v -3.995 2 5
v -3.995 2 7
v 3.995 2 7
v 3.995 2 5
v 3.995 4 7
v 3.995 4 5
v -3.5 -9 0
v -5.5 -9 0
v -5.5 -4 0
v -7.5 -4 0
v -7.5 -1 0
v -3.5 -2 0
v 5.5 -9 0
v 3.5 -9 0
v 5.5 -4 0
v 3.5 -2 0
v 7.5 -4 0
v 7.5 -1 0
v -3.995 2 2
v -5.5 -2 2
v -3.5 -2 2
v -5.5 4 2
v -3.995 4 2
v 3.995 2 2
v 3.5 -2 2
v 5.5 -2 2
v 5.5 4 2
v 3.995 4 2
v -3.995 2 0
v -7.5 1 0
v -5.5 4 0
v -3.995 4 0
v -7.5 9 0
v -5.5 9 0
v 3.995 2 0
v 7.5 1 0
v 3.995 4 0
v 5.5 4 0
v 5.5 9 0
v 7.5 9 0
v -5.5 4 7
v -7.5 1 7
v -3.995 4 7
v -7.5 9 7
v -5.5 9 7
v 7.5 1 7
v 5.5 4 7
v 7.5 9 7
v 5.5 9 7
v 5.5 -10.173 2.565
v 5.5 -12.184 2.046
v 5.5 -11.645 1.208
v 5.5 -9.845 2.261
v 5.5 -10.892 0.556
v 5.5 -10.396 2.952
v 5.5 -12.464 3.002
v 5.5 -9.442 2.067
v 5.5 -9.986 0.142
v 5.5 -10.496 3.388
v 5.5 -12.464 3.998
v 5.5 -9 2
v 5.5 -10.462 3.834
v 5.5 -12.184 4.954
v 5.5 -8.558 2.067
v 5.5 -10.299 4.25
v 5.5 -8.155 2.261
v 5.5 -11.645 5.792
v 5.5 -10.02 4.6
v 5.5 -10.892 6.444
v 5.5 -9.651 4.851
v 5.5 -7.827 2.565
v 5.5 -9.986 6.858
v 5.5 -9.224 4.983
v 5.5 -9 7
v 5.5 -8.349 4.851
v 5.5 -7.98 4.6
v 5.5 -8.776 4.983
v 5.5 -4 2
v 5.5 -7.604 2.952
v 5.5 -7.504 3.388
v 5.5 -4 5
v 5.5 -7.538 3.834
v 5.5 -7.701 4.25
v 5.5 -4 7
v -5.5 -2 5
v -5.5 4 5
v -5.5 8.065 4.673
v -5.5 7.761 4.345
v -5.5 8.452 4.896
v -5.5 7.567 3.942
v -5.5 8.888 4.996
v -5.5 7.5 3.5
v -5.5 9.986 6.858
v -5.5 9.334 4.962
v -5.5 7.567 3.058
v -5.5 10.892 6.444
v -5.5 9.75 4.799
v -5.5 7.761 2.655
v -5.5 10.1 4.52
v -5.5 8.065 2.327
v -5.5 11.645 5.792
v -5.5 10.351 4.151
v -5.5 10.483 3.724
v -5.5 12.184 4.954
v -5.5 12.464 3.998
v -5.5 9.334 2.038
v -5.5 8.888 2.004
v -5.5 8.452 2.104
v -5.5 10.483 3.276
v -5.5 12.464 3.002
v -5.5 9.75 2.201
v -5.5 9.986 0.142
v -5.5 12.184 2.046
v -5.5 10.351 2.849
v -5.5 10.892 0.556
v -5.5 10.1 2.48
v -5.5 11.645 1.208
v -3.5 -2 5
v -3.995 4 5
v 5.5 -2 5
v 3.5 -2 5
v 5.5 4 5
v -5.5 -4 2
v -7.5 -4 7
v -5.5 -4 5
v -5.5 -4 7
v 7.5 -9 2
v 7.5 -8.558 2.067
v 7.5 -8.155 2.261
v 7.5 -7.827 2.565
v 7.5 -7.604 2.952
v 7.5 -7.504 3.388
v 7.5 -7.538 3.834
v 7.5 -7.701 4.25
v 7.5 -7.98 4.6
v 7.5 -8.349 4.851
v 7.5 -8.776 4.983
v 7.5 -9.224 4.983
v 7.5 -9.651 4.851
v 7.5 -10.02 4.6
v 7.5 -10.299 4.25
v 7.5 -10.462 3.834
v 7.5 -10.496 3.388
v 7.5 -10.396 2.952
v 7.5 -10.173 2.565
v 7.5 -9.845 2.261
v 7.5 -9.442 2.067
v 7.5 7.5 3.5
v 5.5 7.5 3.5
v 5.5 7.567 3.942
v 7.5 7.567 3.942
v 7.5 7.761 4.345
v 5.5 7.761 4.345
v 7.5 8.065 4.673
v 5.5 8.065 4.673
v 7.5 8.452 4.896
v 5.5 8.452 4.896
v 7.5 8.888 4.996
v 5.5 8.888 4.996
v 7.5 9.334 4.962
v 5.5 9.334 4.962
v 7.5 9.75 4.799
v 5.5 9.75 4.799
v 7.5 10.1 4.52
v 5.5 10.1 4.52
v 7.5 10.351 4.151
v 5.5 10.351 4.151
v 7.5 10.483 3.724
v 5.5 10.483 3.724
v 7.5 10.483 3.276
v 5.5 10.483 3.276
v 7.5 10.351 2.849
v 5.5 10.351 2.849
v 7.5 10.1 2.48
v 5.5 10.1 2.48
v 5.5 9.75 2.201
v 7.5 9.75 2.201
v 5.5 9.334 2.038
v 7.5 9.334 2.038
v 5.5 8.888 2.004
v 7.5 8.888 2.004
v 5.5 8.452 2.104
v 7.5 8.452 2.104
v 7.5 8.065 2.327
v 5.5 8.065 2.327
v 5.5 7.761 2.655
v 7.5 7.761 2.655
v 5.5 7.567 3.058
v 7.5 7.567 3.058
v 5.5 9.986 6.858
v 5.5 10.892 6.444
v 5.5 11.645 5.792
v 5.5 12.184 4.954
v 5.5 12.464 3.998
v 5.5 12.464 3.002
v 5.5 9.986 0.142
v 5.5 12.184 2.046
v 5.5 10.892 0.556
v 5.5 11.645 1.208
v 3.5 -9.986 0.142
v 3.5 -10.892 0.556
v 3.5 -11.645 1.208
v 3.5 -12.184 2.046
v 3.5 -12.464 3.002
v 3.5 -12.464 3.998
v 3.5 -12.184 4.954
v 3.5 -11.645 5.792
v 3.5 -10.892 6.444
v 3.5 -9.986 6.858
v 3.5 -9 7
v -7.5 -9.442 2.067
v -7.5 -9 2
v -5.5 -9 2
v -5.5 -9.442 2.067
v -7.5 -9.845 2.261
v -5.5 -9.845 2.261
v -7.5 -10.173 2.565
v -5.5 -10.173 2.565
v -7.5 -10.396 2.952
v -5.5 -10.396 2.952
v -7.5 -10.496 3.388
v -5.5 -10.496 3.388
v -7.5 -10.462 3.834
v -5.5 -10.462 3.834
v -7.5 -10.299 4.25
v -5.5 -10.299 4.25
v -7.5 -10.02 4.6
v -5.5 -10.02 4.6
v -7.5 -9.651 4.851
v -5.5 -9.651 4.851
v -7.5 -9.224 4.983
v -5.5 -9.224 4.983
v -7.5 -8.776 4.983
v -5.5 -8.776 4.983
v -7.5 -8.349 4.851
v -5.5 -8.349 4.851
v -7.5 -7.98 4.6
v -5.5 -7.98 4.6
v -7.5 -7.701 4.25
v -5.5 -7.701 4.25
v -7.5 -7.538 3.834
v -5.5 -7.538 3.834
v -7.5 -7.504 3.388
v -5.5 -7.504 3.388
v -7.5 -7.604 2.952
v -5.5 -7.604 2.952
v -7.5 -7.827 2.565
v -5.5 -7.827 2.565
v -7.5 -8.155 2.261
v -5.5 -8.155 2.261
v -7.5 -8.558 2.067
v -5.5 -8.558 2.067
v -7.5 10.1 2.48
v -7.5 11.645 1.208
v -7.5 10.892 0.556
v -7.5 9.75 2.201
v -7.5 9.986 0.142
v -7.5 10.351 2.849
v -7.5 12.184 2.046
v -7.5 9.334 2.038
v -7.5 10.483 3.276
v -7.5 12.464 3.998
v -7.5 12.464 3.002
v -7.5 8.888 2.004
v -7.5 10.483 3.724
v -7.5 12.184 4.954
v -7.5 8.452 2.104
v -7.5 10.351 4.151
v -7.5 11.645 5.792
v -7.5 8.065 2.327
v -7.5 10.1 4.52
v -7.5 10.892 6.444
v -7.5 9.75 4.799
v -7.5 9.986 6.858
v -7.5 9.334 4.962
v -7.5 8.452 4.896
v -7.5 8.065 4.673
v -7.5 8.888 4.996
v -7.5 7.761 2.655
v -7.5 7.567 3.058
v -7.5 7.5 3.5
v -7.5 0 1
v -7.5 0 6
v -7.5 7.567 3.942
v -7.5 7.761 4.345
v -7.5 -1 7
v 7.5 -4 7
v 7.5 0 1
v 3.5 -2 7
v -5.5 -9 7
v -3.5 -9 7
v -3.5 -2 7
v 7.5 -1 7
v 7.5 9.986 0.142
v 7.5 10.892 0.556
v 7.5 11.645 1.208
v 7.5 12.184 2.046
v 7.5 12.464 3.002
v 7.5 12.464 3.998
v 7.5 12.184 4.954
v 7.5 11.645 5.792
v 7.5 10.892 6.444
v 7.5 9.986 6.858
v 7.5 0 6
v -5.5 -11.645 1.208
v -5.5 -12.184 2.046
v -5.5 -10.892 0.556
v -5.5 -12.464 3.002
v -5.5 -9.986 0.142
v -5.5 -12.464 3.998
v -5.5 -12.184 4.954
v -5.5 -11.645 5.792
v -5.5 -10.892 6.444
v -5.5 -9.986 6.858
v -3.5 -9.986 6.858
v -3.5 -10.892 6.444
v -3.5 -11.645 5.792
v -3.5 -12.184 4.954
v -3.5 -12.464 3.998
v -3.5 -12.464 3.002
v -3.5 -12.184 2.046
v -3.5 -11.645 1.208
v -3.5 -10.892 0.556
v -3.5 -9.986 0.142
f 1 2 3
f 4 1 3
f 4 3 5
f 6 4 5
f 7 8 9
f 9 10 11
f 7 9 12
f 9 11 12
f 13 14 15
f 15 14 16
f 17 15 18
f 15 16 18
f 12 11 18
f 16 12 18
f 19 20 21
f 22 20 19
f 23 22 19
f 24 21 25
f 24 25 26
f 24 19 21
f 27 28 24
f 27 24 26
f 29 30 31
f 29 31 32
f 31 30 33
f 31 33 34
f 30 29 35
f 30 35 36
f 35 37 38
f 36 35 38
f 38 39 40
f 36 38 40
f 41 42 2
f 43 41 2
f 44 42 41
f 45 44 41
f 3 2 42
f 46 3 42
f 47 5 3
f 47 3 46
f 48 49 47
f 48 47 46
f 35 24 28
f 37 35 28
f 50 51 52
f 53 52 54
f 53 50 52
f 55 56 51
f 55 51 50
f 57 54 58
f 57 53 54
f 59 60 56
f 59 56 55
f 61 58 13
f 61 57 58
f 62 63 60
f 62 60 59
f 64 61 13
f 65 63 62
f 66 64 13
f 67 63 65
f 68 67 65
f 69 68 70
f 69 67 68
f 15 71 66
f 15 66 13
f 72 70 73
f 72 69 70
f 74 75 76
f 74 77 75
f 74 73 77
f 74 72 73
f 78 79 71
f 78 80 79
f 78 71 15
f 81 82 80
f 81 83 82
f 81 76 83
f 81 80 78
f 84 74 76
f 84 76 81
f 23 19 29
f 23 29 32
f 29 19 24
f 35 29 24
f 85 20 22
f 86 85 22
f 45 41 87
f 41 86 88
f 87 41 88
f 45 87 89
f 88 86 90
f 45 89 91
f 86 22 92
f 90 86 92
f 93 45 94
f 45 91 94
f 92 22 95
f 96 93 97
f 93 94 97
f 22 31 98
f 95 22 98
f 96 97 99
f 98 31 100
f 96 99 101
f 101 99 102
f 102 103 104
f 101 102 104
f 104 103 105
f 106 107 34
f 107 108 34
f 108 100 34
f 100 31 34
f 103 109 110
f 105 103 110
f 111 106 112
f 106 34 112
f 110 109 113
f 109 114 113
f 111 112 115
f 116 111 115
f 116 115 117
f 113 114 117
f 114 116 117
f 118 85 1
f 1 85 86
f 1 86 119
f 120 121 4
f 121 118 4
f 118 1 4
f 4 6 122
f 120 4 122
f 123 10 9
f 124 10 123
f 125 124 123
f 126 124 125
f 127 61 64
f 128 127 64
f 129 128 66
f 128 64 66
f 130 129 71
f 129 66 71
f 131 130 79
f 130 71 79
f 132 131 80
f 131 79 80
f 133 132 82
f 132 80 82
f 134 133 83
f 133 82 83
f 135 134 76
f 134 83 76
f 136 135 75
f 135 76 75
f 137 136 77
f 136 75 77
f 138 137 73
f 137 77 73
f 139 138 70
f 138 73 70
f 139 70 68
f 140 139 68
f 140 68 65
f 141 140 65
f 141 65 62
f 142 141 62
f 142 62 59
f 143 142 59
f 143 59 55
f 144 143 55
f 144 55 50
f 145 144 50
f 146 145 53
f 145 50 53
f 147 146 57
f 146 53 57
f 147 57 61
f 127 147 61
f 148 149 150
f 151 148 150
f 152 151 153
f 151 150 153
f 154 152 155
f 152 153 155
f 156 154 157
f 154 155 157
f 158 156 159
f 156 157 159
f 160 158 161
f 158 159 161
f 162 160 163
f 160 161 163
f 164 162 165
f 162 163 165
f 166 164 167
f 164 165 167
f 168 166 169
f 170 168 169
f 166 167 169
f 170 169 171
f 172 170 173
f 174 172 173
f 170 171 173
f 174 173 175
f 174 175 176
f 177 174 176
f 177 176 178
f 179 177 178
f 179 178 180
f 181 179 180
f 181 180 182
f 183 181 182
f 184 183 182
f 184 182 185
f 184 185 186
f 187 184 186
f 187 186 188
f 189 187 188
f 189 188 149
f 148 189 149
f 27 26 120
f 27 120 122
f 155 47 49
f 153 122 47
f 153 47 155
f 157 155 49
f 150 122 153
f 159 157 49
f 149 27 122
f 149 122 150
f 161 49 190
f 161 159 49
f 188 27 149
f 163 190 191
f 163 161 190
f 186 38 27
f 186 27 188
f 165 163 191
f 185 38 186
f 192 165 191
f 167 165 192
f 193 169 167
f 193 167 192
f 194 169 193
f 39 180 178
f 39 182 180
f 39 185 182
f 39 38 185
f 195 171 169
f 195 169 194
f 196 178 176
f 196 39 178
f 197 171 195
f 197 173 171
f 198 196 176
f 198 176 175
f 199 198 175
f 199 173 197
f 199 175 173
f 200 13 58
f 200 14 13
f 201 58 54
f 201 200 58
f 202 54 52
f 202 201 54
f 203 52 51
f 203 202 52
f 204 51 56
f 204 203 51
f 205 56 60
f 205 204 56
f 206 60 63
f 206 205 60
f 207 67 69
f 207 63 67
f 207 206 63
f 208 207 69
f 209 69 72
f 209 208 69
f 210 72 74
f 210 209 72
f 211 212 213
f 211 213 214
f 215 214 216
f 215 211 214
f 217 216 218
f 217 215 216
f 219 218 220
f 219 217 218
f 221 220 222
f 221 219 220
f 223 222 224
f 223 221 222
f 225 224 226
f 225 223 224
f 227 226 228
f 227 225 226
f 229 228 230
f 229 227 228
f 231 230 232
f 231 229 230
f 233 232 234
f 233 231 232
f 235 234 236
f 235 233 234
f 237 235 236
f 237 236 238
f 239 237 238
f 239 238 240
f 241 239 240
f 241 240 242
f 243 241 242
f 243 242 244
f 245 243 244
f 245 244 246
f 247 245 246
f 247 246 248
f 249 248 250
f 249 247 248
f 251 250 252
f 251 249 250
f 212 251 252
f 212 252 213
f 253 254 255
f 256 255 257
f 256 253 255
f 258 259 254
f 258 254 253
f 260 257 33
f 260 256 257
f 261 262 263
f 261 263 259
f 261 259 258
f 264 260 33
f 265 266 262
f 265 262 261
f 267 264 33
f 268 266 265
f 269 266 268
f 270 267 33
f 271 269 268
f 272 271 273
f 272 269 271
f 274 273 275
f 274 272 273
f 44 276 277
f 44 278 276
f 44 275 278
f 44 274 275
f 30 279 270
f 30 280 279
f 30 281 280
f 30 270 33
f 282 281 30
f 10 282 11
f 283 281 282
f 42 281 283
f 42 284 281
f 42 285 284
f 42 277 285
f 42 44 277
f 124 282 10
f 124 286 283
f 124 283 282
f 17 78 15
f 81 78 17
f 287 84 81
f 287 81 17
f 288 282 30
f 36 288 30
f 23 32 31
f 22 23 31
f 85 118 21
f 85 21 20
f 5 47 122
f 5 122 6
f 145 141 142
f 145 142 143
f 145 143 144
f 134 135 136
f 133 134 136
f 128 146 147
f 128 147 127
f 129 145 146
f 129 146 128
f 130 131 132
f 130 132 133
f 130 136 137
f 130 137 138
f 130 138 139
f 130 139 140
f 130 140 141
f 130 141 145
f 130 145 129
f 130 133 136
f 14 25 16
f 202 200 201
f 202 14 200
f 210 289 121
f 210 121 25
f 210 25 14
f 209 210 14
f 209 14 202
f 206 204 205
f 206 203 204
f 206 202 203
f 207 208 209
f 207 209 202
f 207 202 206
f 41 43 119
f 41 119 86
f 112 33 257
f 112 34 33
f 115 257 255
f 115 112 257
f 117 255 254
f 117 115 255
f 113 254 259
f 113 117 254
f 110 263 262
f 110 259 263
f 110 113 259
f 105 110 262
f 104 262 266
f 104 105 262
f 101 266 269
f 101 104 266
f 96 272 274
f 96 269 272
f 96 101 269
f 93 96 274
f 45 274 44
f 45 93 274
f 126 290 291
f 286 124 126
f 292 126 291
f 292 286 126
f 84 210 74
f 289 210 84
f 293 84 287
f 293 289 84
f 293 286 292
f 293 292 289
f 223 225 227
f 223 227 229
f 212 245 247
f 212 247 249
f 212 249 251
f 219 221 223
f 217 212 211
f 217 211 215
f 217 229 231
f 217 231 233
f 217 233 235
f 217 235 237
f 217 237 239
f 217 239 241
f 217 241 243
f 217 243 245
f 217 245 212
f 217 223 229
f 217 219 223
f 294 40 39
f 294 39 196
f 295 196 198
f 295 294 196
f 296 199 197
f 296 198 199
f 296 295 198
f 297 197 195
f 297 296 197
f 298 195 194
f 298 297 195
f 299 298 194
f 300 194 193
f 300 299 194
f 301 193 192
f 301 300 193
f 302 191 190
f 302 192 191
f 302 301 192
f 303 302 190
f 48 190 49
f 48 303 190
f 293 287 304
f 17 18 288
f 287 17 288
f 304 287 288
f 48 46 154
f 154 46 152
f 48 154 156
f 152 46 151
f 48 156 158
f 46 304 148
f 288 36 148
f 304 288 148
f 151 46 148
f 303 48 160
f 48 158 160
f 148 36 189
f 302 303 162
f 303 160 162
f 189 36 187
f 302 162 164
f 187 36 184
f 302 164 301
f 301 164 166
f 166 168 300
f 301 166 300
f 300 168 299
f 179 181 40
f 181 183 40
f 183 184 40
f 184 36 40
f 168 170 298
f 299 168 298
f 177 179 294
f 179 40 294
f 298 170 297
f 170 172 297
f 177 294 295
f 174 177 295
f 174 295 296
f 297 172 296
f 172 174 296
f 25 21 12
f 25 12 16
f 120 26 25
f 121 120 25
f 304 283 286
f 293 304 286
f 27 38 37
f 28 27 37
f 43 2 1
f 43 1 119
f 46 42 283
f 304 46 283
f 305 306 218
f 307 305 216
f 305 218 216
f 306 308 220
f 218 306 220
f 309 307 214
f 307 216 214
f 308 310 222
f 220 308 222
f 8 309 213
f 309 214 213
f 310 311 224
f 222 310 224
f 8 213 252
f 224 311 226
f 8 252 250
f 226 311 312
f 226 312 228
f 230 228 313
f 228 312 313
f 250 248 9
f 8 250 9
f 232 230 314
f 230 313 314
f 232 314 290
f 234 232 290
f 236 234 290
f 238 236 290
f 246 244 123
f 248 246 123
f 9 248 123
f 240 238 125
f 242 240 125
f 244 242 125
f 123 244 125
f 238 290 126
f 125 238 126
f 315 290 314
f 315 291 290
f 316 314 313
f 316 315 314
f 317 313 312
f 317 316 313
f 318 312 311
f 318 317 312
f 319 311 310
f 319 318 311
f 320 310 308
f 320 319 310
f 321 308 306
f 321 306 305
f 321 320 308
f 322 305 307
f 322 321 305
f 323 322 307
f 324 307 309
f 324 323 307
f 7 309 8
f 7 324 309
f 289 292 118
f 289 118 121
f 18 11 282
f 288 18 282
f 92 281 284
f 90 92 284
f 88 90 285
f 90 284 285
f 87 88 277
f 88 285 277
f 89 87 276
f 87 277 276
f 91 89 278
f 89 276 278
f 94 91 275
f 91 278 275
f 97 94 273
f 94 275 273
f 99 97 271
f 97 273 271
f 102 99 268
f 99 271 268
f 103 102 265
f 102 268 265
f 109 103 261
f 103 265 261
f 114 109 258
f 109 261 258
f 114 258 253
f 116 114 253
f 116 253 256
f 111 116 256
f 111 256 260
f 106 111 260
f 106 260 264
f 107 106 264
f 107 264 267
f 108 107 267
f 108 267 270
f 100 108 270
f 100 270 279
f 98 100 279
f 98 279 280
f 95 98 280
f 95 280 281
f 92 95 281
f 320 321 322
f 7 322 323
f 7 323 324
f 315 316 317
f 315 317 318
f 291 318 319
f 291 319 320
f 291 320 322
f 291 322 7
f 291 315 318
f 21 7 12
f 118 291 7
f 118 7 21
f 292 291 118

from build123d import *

# Parameters (mm, degrees)
SKETCH_1_W          = 15
SKETCH_1_H          = 25
EXTRUDE_1_DEPTH     = 2
SKETCH_2_W          = 2
SKETCH_2_H          = 25
EXTRUDE_2_DEPTH     = 5
SKETCH_4_W          = 13
SKETCH_4_H          = 4
SKETCH_4_W_2        = 2
EXTRUDE_3_DEPTH     = 2
SKETCH_5_W          = 11
SKETCH_5_H          = 8.5
CUT_EXTRUDE_1_DEPTH = 2
SKETCH_6_W          = 7.990156946
SKETCH_6_H          = 2
CUT_EXTRUDE_2_DEPTH = 17.170961629
CUT_EXTRUDE_3_DEPTH = 21.742468513
FILLET_1_RADIUS     = 3.5
FILLET_1_LENGTH     = 2
FILLET_2_RADIUS     = 3.5
FILLET_2_LENGTH     = 2
SKETCH_9_R          = 1.5
CUT_EXTRUDE_4_DEPTH = 21.742468513
SKETCH_13_W         = 2
SKETCH_13_H         = 8.5
CUT_EXTRUDE_7_DEPTH = 7
SKETCH_14_W         = 1.504921527
SKETCH_14_H         = 2
EXTRUDE_8_DEPTH     = 7
FILLET_3_RADIUS     = 3.5
FILLET_3_LENGTH     = 2
FILLET_4_RADIUS     = 3.5
FILLET_4_LENGTH     = 2
SKETCH_15_R         = 1.5
EXTRUDE_9_DEPTH     = 2
EXTRUDE_START       = 2
SKETCH_16_R         = 1.5
EXTRUDE_10_DEPTH    = 2


with BuildPart() as part:
    # Эскиз1 → Бобышка-Вытянуть1 (new body)
    with BuildSketch(Plane.XY):
        Rectangle(SKETCH_1_W, SKETCH_1_H)
    extrude(amount=EXTRUDE_1_DEPTH)

    # Эскиз2 → Бобышка-Вытянуть2 (add)
    with BuildSketch(Plane.XY.offset(2)):
        with Locations((-6.5, 0)):
            Rectangle(SKETCH_2_W, SKETCH_2_H)
        with Locations((6.5, 0)):
            Rectangle(SKETCH_2_W, SKETCH_2_H)
    extrude(amount=EXTRUDE_2_DEPTH)

    # Эскиз4 → Бобышка-Вытянуть3 (add)
    with BuildSketch(Plane.XY.offset(7)):
        with Locations((-1, 2)):
            Rectangle(SKETCH_4_W, SKETCH_4_H)
        with Locations((-1, -2)):
            Rectangle(SKETCH_4_W, SKETCH_4_H)
        with Locations((6.5, -2)):
            Rectangle(SKETCH_4_W_2, SKETCH_4_H)
        with Locations((6.5, 2)):
            Rectangle(SKETCH_4_W_2, SKETCH_4_H)
    extrude(amount=-EXTRUDE_3_DEPTH)

    # Эскиз5 → Вырез-Вытянуть1 (cut)
    with BuildSketch(Plane(origin=(0, 0, 0), x_dir=(-1, 0, 0), z_dir=(0, 0, -1))):
        with Locations((0, 8.25)):
            Rectangle(SKETCH_5_W, SKETCH_5_H)
        with Locations((0, -8.25)):
            Rectangle(SKETCH_5_W, SKETCH_5_H)
    extrude(amount=-CUT_EXTRUDE_1_DEPTH, mode=Mode.SUBTRACT)

    # Эскиз6 → Вырез-Вытянуть2 (cut, through all)
    with BuildSketch(Plane.XY.offset(7)):
        with Locations((0, 3)):
            Rectangle(SKETCH_6_W, SKETCH_6_H)
        with Locations((0, -3)):
            Rectangle(SKETCH_6_W, SKETCH_6_H)
    extrude(amount=-CUT_EXTRUDE_2_DEPTH, mode=Mode.SUBTRACT)

    # Эскиз8 → Вырез-Вытянуть3 (cut, through all)
    with BuildSketch(Plane.ZY.offset(7.5)):
        Polygon((7, -1), (7, 0), (6, 0), align=None)
        Polygon((6, 0), (7, 0), (7, 1), align=None)
        Polygon((0, -1), (1, 0), (0, 0), align=None)
        Polygon((0, 0), (1, 0), (0, 1), align=None)
    extrude(amount=-CUT_EXTRUDE_3_DEPTH, mode=Mode.SUBTRACT)

    # Скругление1: full round fillet: the end face becomes a half cylinder, R = half its width
    fillet_1_face = Plane((-6.5, 12.5, 3.5), x_dir=(1, 0, 0), z_dir=(0, 1, 0))  # on the end face: x along it, z out of the body
    fillet_1_slab = fillet_1_face.offset(-FILLET_1_RADIUS / 2) * Box(FILLET_1_LENGTH, 2 * FILLET_1_RADIUS, FILLET_1_RADIUS, mode=Mode.PRIVATE)  # the body's end, R deep
    fillet_1_round = Plane((-6.5, 9, 3.5), x_dir=(0, 1, 0), z_dir=(1, 0, 0)) * Cylinder(FILLET_1_RADIUS, FILLET_1_LENGTH, mode=Mode.PRIVATE)  # its axis R under the face
    add(fillet_1_slab - fillet_1_round, mode=Mode.SUBTRACT)

    # Скругление2: full round fillet: the end face becomes a half cylinder, R = half its width
    fillet_2_face = Plane((6.5, 12.5, 3.5), x_dir=(1, 0, 0), z_dir=(0, 1, 0))  # on the end face: x along it, z out of the body
    fillet_2_slab = fillet_2_face.offset(-FILLET_2_RADIUS / 2) * Box(FILLET_2_LENGTH, 2 * FILLET_2_RADIUS, FILLET_2_RADIUS, mode=Mode.PRIVATE)  # the body's end, R deep
    fillet_2_round = Plane((6.5, 9, 3.5), x_dir=(0, 1, 0), z_dir=(1, 0, 0)) * Cylinder(FILLET_2_RADIUS, FILLET_2_LENGTH, mode=Mode.PRIVATE)  # its axis R under the face
    add(fillet_2_slab - fillet_2_round, mode=Mode.SUBTRACT)

    # Эскиз9 → Вырез-Вытянуть4 (cut, through all)
    with BuildSketch(Plane.ZY.offset(7.5)):
        with Locations(Location((3.5, 9, 0), (0, 0, 270))):
            Circle(SKETCH_9_R)
    extrude(amount=-CUT_EXTRUDE_4_DEPTH, mode=Mode.SUBTRACT)

    # Эскиз13 → Вырез-Вытянуть7 (cut)
    with BuildSketch(Plane.XY.offset(7)):
        with Locations((6.5, -8.25)):
            Rectangle(SKETCH_13_W, SKETCH_13_H)
        with Locations((-6.5, -8.25)):
            Rectangle(SKETCH_13_W, SKETCH_13_H)
    extrude(amount=-CUT_EXTRUDE_7_DEPTH, mode=Mode.SUBTRACT)

    # Эскиз14 → Бобышка-Вытянуть8 (add)
    with BuildSketch(Plane.XY.offset(7)):
        Polygon((5.5, -12.5), (5.5, -4), (3.995078473, -4), (3.995078473, -2), (3.5, -2), (3.5, -12.5), align=None)
        with Locations((4.747539236, -3)):
            Rectangle(SKETCH_14_W, SKETCH_14_H)
        Polygon((-3.5, -12.5), (-3.5, -2), (-3.995078473, -2), (-3.995078473, -4), (-5.5, -4), (-5.5, -12.5), align=None)
        with Locations((-4.747539236, -3)):
            Rectangle(SKETCH_14_W, SKETCH_14_H)
    extrude(amount=-EXTRUDE_8_DEPTH)

    # Скругление3: full round fillet: the end face becomes a half cylinder, R = half its width
    fillet_3_face = Plane((-4.5, -12.5, 3.5), x_dir=(1, 0, 0), z_dir=(0, -1, 0))  # on the end face: x along it, z out of the body
    fillet_3_slab = fillet_3_face.offset(-FILLET_3_RADIUS / 2) * Box(FILLET_3_LENGTH, 2 * FILLET_3_RADIUS, FILLET_3_RADIUS, mode=Mode.PRIVATE)  # the body's end, R deep
    fillet_3_round = Plane((-4.5, -9, 3.5), x_dir=(0, -1, 0), z_dir=(1, 0, 0)) * Cylinder(FILLET_3_RADIUS, FILLET_3_LENGTH, mode=Mode.PRIVATE)  # its axis R under the face
    add(fillet_3_slab - fillet_3_round, mode=Mode.SUBTRACT)

    # Скругление4: full round fillet: the end face becomes a half cylinder, R = half its width
    fillet_4_face = Plane((4.5, -12.5, 3.5), x_dir=(-1, 0, 0), z_dir=(0, -1, 0))  # on the end face: x along it, z out of the body
    fillet_4_slab = fillet_4_face.offset(-FILLET_4_RADIUS / 2) * Box(FILLET_4_LENGTH, 2 * FILLET_4_RADIUS, FILLET_4_RADIUS, mode=Mode.PRIVATE)  # the body's end, R deep
    fillet_4_round = Plane((4.5, -9, 3.5), x_dir=(0, -1, 0), z_dir=(-1, 0, 0)) * Cylinder(FILLET_4_RADIUS, FILLET_4_LENGTH, mode=Mode.PRIVATE)  # its axis R under the face
    add(fillet_4_slab - fillet_4_round, mode=Mode.SUBTRACT)

    # Эскиз15 → Бобышка-Вытянуть9 (add)
    with BuildSketch(Plane(origin=(5.5, 0, 0), x_dir=(0, 0, -1), z_dir=(1, 0, 0))):
        with Locations((-3.5, -9)):
            Circle(SKETCH_15_R)
    extrude(amount=EXTRUDE_9_DEPTH)

    # Эскиз16 → Бобышка-Вытянуть10 (add)
    with BuildSketch(Plane.ZY.offset(5.5).offset(EXTRUDE_START)):
        with Locations(Location((3.5, -9, 0), (0, 0, 180))):
            Circle(SKETCH_16_R)
    extrude(amount=-EXTRUDE_10_DEPTH)


solid = part.part
